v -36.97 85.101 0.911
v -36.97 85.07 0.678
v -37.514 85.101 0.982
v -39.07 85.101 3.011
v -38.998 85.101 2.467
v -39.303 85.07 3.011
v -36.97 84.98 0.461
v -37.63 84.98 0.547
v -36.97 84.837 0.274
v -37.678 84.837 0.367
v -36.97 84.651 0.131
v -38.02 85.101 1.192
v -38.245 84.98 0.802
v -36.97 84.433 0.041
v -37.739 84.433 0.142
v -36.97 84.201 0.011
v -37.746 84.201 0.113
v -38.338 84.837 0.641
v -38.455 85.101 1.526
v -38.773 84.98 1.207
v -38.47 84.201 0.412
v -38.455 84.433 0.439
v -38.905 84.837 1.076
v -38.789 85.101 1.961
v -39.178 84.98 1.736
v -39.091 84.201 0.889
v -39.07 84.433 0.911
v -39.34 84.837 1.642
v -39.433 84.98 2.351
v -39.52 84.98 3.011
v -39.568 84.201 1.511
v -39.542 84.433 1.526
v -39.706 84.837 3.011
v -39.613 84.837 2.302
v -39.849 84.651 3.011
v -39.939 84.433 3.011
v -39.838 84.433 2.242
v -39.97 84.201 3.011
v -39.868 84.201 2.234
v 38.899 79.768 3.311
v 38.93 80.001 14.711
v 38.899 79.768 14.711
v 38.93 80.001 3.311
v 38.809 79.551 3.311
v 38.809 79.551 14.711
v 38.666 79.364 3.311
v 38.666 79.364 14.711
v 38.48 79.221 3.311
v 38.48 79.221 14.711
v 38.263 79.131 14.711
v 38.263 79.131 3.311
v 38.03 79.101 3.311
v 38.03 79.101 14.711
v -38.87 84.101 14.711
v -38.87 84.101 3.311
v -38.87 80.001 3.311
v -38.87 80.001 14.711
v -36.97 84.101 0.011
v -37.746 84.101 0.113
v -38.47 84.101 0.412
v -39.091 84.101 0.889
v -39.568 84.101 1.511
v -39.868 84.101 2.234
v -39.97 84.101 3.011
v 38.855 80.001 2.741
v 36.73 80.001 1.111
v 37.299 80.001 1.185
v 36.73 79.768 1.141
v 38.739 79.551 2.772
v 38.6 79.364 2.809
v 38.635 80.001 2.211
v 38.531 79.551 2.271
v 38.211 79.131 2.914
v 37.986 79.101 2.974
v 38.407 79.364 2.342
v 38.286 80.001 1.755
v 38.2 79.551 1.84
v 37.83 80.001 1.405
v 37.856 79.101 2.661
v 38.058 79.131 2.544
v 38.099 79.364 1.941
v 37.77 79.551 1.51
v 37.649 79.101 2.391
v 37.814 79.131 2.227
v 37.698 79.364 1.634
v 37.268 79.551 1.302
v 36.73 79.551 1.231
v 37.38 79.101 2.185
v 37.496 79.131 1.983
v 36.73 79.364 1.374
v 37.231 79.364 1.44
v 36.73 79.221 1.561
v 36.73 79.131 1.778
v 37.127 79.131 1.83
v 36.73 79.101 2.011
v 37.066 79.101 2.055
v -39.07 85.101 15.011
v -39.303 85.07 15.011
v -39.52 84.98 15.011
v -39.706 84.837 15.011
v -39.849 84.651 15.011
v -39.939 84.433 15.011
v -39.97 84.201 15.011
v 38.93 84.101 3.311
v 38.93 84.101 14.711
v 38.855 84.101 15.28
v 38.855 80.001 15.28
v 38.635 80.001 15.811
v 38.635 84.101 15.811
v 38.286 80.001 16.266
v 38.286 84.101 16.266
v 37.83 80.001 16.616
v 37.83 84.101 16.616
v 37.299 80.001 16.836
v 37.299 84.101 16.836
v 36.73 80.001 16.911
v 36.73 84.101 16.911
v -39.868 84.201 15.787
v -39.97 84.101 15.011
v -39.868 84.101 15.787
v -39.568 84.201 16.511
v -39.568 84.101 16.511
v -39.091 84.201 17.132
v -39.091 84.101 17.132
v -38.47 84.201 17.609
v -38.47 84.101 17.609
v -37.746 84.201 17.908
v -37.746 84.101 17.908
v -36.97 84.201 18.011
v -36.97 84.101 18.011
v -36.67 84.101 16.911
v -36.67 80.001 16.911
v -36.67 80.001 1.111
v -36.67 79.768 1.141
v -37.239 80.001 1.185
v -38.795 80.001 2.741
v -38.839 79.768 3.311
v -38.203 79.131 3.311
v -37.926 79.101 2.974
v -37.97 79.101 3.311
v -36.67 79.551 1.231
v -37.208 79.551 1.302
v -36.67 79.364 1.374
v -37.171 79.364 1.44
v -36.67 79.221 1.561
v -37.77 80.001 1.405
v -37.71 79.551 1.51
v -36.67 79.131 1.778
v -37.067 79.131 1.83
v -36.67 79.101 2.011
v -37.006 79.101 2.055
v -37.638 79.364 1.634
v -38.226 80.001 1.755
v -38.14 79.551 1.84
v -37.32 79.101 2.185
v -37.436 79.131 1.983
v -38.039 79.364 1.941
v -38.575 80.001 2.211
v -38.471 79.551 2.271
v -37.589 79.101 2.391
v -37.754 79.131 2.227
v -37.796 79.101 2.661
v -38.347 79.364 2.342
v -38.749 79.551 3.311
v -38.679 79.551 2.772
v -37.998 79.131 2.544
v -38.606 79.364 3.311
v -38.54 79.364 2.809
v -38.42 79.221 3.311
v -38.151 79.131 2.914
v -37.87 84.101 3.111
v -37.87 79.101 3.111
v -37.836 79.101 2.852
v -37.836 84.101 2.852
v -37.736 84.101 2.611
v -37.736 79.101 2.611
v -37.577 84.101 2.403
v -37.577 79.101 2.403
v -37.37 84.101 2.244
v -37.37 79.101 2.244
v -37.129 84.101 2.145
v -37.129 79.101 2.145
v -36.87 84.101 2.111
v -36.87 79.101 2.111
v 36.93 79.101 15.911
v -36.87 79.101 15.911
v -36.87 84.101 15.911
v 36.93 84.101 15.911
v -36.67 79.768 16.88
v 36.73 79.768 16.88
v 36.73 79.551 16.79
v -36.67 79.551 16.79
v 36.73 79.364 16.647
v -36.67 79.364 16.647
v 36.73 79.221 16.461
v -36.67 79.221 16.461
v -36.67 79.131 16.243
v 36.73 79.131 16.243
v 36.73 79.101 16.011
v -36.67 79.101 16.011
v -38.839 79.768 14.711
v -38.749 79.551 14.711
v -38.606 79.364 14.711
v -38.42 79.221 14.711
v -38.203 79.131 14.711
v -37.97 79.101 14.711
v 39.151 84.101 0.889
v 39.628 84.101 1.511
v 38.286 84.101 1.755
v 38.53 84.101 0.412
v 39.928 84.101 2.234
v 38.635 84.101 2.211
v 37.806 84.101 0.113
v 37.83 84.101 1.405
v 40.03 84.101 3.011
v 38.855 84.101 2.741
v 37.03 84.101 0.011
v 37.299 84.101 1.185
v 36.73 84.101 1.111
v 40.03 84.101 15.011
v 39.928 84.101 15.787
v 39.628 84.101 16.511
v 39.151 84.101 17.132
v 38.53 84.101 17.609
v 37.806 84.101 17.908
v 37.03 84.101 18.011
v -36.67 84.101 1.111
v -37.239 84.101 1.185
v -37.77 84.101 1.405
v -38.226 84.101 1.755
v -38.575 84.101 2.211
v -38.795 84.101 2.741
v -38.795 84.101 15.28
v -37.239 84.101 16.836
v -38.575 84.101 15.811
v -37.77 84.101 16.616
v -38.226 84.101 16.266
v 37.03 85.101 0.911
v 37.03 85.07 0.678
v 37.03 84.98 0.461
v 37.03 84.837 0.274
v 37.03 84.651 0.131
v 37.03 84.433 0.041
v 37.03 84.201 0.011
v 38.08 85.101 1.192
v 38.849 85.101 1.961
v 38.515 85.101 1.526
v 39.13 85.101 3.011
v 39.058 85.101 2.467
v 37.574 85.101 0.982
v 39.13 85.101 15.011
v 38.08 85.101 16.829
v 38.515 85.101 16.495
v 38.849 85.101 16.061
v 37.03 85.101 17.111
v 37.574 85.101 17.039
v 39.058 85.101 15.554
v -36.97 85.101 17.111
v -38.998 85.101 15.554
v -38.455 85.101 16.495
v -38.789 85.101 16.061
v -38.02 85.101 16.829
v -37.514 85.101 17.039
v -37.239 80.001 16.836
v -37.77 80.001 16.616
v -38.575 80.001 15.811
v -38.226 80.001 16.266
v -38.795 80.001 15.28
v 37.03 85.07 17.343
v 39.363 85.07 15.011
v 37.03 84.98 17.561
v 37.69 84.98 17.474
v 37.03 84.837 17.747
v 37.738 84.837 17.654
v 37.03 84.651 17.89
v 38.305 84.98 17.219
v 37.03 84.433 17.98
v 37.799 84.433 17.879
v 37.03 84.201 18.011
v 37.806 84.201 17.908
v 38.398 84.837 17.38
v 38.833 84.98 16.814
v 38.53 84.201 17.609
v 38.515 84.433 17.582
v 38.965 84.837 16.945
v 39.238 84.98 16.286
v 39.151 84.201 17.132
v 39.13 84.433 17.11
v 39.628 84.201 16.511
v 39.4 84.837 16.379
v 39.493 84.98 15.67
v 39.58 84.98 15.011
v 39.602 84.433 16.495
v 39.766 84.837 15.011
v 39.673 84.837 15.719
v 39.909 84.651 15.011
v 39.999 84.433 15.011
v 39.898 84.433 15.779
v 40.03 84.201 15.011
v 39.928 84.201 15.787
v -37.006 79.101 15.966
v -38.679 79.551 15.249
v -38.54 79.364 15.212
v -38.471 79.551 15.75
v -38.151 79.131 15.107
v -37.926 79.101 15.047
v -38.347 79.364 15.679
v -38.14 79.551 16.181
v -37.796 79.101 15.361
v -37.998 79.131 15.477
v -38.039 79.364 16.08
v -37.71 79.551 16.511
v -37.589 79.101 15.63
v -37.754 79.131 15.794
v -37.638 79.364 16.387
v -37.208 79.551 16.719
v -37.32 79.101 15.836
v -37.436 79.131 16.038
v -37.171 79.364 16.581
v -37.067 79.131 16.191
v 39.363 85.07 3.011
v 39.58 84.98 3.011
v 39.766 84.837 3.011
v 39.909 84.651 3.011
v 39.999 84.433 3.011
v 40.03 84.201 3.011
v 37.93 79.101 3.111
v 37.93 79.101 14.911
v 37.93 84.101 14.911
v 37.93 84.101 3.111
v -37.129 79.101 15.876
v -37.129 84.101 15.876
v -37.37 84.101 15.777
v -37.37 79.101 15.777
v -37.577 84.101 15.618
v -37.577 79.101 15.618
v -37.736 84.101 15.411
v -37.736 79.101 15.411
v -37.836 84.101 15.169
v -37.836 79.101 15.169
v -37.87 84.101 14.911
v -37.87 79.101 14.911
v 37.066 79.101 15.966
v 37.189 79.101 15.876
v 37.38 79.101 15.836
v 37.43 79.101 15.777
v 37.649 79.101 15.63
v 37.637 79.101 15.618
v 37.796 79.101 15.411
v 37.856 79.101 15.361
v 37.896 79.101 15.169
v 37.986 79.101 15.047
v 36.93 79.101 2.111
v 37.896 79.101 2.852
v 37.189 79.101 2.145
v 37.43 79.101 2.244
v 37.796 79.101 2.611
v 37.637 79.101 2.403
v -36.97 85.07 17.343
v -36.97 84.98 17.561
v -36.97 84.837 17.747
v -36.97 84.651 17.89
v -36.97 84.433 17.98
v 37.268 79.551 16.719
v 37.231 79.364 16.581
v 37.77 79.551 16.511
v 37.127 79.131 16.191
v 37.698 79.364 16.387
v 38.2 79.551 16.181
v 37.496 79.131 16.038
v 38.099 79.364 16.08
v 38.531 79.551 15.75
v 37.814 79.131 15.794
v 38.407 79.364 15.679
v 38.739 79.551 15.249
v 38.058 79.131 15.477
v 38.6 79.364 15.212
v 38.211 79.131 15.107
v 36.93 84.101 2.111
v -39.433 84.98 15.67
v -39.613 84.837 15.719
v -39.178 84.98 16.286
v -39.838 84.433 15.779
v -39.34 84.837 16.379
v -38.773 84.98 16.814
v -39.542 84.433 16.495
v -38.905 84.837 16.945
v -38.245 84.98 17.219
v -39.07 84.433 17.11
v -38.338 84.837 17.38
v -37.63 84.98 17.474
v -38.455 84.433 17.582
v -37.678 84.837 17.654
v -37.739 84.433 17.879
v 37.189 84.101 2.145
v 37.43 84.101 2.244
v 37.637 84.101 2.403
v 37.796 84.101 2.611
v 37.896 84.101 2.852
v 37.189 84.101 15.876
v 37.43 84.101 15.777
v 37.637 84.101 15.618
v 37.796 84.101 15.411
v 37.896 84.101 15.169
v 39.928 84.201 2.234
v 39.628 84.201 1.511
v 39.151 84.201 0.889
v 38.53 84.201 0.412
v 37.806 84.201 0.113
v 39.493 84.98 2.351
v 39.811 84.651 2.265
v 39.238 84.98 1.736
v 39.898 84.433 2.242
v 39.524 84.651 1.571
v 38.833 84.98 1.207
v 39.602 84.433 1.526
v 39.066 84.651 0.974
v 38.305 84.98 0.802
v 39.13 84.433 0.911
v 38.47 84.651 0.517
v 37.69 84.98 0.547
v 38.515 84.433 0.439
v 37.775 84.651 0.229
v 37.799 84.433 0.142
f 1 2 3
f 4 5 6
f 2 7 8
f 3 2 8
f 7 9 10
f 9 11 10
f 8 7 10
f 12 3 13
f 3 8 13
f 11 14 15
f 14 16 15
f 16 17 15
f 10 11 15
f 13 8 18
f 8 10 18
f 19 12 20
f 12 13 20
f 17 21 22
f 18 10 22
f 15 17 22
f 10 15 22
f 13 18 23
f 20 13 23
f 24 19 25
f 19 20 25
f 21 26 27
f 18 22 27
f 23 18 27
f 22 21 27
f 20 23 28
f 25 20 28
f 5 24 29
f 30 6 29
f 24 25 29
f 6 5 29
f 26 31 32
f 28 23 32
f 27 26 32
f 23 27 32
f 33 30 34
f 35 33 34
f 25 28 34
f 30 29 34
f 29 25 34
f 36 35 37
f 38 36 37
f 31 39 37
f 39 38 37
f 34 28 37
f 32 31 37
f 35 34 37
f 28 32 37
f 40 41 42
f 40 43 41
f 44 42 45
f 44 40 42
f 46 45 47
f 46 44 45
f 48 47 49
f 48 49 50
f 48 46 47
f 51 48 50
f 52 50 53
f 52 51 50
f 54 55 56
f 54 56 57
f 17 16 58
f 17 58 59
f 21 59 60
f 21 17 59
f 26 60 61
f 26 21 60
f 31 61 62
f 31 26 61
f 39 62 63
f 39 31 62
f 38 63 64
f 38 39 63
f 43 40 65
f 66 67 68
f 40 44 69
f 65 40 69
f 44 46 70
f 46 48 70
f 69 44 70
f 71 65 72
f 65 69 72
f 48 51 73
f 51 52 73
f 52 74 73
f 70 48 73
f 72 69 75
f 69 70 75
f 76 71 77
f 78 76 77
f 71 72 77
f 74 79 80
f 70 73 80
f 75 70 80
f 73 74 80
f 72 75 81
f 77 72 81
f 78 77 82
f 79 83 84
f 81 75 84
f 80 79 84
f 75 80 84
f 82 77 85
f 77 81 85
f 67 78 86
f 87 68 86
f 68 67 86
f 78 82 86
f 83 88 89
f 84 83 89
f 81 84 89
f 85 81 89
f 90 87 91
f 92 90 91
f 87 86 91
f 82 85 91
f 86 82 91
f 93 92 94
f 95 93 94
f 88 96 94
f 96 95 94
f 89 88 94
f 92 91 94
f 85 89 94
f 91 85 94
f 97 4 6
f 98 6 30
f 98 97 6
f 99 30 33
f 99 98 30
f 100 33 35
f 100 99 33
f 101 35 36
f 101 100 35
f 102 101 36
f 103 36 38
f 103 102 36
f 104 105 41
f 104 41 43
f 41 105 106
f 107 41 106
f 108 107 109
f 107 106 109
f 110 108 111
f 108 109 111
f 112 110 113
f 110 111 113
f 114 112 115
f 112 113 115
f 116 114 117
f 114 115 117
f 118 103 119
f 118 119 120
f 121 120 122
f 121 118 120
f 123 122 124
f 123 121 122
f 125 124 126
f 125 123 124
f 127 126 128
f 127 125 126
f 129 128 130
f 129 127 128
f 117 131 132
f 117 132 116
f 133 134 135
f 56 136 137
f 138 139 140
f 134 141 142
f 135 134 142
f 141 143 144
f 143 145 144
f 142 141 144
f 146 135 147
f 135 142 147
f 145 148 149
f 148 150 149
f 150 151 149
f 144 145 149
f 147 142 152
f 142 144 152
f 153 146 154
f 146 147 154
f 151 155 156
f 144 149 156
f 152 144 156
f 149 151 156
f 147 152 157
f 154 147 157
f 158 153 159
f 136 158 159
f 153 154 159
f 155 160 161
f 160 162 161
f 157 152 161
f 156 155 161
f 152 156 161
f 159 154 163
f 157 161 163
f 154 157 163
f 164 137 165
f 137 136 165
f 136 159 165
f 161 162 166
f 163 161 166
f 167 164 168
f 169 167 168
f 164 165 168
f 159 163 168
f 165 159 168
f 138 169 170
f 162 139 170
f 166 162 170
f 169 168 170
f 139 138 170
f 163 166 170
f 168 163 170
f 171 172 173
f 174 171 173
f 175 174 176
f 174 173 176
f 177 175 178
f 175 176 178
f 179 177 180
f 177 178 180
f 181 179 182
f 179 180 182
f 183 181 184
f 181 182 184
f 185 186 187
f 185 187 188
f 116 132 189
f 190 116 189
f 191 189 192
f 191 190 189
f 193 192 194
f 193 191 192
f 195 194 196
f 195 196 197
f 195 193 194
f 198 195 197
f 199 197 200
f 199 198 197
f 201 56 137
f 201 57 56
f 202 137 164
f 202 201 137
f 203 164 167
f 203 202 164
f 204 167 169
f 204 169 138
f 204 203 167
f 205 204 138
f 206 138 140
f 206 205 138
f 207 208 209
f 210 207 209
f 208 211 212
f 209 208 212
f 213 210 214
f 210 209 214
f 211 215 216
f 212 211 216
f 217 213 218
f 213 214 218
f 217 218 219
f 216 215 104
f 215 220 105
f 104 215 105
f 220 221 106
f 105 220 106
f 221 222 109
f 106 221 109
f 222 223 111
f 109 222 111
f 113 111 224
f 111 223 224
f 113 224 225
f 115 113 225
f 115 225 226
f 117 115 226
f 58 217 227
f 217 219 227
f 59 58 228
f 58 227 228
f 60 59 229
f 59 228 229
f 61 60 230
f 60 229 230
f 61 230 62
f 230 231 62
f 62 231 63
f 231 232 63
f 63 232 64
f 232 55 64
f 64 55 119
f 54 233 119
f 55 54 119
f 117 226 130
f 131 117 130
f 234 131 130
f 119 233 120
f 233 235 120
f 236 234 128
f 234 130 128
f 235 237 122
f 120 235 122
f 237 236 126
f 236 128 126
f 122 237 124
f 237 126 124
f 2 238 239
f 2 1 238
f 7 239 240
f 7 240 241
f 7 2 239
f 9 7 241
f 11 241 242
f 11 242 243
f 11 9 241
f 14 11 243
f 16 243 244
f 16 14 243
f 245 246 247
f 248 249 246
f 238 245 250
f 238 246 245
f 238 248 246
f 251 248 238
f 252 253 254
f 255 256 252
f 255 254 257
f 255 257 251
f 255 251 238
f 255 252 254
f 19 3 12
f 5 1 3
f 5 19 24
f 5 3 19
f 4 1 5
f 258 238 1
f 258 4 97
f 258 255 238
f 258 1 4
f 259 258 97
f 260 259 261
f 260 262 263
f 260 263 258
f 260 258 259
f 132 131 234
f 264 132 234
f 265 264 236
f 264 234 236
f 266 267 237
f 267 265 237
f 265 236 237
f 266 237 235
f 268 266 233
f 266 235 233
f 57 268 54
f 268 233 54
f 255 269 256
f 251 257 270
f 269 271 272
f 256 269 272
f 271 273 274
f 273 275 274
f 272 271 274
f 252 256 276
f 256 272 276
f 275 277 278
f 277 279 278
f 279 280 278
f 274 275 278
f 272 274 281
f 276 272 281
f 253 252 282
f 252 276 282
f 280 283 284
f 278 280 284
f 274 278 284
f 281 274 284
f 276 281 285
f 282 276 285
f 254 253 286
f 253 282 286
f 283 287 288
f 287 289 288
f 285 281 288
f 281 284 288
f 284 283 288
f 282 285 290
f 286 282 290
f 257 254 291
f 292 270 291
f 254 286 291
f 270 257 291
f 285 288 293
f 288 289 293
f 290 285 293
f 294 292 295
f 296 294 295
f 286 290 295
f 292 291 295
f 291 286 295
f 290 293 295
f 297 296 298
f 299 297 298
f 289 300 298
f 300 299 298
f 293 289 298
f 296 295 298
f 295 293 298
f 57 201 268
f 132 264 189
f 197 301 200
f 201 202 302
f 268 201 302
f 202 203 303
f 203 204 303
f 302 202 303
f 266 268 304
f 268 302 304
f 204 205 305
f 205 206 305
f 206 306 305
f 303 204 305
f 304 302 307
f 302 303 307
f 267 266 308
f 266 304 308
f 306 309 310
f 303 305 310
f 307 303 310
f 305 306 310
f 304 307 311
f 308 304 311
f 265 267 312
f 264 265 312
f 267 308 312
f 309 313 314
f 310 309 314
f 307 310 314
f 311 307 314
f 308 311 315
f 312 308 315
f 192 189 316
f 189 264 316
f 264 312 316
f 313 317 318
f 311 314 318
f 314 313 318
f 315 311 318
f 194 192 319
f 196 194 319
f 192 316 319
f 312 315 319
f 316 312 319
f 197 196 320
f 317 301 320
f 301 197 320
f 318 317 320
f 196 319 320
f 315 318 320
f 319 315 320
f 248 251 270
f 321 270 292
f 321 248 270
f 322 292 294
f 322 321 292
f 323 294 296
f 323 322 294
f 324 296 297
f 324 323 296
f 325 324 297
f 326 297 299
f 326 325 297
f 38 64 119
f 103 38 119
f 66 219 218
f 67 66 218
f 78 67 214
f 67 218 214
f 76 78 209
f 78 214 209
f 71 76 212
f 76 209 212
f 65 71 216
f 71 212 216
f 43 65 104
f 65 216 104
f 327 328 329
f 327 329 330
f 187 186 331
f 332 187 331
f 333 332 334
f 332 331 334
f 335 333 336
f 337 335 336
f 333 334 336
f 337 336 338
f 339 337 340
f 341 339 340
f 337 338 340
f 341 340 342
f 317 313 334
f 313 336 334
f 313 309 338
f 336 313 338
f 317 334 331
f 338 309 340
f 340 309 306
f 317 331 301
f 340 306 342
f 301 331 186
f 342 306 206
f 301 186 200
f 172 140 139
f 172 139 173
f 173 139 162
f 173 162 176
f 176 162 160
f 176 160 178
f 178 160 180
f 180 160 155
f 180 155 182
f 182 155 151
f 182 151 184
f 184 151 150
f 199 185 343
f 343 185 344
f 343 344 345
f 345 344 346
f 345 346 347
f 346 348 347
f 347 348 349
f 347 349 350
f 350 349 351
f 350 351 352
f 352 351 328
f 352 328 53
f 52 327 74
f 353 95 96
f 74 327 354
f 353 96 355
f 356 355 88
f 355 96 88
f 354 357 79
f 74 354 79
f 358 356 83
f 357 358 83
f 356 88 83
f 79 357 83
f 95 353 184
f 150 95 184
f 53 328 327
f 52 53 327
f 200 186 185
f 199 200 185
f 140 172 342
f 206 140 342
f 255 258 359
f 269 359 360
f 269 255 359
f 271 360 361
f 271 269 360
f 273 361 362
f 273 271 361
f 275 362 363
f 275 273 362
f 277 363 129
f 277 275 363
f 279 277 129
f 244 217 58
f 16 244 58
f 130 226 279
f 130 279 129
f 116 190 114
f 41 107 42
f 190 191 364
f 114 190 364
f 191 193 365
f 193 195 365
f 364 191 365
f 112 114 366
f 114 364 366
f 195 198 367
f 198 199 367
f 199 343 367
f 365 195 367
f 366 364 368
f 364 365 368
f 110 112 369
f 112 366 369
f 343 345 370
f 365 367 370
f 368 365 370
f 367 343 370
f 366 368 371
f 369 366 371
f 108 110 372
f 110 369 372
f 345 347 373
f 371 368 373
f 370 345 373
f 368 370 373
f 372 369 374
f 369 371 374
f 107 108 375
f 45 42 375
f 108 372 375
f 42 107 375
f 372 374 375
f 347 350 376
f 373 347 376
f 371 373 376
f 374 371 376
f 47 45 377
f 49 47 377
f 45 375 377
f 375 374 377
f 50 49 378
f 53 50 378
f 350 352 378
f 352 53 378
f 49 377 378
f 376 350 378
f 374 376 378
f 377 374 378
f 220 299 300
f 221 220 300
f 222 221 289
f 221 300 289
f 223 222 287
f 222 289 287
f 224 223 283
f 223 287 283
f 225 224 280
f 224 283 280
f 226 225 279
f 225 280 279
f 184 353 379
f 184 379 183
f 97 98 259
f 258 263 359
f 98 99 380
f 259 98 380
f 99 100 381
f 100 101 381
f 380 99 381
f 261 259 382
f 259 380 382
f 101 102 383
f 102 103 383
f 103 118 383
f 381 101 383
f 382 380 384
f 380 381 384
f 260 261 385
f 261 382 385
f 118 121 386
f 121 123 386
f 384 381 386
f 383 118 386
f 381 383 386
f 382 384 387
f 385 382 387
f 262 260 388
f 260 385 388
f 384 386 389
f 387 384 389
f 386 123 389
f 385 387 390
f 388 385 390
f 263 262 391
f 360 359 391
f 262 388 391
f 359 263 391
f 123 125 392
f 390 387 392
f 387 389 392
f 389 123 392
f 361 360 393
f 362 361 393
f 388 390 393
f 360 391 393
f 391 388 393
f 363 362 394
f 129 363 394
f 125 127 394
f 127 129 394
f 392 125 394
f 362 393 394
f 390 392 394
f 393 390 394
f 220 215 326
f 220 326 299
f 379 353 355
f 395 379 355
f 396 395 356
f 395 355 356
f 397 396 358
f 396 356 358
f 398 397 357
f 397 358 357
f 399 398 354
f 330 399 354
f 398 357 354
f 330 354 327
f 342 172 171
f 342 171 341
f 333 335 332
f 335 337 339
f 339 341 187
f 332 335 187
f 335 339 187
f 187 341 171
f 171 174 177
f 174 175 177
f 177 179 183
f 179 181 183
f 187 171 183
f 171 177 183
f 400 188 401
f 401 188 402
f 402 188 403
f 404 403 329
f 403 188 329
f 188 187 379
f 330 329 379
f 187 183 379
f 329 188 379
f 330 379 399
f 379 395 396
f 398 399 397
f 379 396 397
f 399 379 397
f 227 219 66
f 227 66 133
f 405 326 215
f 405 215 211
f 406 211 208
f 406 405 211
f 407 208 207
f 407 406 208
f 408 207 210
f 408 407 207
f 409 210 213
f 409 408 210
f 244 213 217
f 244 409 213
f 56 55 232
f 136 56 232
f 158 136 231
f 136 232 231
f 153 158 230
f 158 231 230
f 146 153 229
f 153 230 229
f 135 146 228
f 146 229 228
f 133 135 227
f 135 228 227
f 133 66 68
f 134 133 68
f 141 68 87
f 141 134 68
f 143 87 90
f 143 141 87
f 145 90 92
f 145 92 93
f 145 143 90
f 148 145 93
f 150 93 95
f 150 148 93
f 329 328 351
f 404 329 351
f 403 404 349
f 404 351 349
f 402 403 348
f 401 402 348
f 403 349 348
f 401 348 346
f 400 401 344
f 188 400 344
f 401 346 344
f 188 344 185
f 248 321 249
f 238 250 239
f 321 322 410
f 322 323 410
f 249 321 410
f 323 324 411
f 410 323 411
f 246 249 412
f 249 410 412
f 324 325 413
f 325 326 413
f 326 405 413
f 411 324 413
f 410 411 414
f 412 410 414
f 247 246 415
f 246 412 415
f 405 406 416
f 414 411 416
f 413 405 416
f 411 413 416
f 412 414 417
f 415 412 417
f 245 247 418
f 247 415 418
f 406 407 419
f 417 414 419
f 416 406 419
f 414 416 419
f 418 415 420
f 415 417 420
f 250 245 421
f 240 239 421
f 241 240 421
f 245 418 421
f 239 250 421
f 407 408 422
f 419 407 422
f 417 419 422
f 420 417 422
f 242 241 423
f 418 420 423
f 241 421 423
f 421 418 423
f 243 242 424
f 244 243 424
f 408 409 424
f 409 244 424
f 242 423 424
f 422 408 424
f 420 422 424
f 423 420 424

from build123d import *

# Parameters (mm, degrees)
SKETCH004_W             = 80
SKETCH004_H             = 18
PAD001_DEPTH            = 1
FILLET001_R             = 3
PAD002_DEPTH            = 5
POCKET001_DEPTH         = 5
FILLET009_R             = 0.9
FILLET010_R             = 0.9
BODY001_PLACEMENT_ANGLE = 90


with BuildPart() as part:
    # Sketch004 → Pad001 (new body)
    with BuildSketch(Plane.YZ):
        with Locations((8.97, 0.91)):
            Rectangle(SKETCH004_W, SKETCH004_H)
    extrude(amount=PAD001_DEPTH)

    # Fillet001
    fillet001_edges = [part.edges().sort_by_distance(p)[0] for p in [
        (0.5, -31.03, -8.09),
        (0.5, -31.03, 9.91),
        (0.5, 48.97, 9.91),
        (0.5, 48.97, -8.09),
    ]]
    fillet(fillet001_edges, radius=FILLET001_R)

    # Sketch005 (on Face2 of Fillet001) → Pad002 (join)
    with BuildSketch(Plane(origin=(0, 0, 0), x_dir=(0, 1, 0), z_dir=(-1, 0, 0))):
        with BuildLine():
            Line((-27.73, 6.99), (45.67, 6.99))
            ThreePointArc((47.87, 4.79), (47.225635, 6.345635), (45.67, 6.99))
            Line((47.87, 4.79), (47.87, -6.61))
            ThreePointArc((45.67, -8.81), (47.225635, -8.165635), (47.87, -6.61))
            Line((45.67, -8.81), (-27.73, -8.81))
            ThreePointArc((-29.93, -6.61), (-29.285635, -8.165635), (-27.73, -8.81))
            Line((-29.93, -6.61), (-29.93, 4.79))
            ThreePointArc((-27.73, 6.99), (-29.285635, 6.345635), (-29.93, 4.79))
        make_face()
    extrude(amount=PAD002_DEPTH)

    # Sketch006 (on Face19 of Pad002) → Pocket001 (cut)
    with BuildSketch(Plane(origin=(-5, 0, 0), x_dir=(0, 1, 0), z_dir=(-1, 0, 0))):
        with BuildLine():
            Line((-27.93, 5.99), (45.87, 5.99))
            ThreePointArc((46.87, 4.99), (46.577107, 5.697107), (45.87, 5.99))
            Line((46.87, 4.99), (46.87, -6.81))
            ThreePointArc((45.87, -7.81), (46.577107, -7.517107), (46.87, -6.81))
            Line((45.87, -7.81), (-27.93, -7.81))
            ThreePointArc((-28.93, -6.81), (-28.637107, -7.517107), (-27.93, -7.81))
            Line((-28.93, -6.81), (-28.93, 4.99))
            ThreePointArc((-27.93, 5.99), (-28.637107, 5.697107), (-28.93, 4.99))
        make_face()
    extrude(amount=-POCKET001_DEPTH, mode=Mode.SUBTRACT)

    # Fillet009
    fillet009_edges = [part.edges().sort_by_distance(p)[0] for p in [
        (1, 8.97, -8.09),
    ]]
    fillet(fillet009_edges, radius=FILLET009_R)

    # Fillet010
    fillet010_edges = [part.edges().sort_by_distance(p)[0] for p in [
        (-5, 8.97, -6.99),
    ]]
    fillet(fillet010_edges, radius=FILLET010_R)


with BuildPart() as part_1:
    # Body001 placement: moved
    add(part.part.moved(Location((9, 84.100505, 8.100505))).rotate(Axis((9, 84.100505, 8.100505), (0, 0, 1)), BODY001_PLACEMENT_ANGLE))


solid = part_1.part
